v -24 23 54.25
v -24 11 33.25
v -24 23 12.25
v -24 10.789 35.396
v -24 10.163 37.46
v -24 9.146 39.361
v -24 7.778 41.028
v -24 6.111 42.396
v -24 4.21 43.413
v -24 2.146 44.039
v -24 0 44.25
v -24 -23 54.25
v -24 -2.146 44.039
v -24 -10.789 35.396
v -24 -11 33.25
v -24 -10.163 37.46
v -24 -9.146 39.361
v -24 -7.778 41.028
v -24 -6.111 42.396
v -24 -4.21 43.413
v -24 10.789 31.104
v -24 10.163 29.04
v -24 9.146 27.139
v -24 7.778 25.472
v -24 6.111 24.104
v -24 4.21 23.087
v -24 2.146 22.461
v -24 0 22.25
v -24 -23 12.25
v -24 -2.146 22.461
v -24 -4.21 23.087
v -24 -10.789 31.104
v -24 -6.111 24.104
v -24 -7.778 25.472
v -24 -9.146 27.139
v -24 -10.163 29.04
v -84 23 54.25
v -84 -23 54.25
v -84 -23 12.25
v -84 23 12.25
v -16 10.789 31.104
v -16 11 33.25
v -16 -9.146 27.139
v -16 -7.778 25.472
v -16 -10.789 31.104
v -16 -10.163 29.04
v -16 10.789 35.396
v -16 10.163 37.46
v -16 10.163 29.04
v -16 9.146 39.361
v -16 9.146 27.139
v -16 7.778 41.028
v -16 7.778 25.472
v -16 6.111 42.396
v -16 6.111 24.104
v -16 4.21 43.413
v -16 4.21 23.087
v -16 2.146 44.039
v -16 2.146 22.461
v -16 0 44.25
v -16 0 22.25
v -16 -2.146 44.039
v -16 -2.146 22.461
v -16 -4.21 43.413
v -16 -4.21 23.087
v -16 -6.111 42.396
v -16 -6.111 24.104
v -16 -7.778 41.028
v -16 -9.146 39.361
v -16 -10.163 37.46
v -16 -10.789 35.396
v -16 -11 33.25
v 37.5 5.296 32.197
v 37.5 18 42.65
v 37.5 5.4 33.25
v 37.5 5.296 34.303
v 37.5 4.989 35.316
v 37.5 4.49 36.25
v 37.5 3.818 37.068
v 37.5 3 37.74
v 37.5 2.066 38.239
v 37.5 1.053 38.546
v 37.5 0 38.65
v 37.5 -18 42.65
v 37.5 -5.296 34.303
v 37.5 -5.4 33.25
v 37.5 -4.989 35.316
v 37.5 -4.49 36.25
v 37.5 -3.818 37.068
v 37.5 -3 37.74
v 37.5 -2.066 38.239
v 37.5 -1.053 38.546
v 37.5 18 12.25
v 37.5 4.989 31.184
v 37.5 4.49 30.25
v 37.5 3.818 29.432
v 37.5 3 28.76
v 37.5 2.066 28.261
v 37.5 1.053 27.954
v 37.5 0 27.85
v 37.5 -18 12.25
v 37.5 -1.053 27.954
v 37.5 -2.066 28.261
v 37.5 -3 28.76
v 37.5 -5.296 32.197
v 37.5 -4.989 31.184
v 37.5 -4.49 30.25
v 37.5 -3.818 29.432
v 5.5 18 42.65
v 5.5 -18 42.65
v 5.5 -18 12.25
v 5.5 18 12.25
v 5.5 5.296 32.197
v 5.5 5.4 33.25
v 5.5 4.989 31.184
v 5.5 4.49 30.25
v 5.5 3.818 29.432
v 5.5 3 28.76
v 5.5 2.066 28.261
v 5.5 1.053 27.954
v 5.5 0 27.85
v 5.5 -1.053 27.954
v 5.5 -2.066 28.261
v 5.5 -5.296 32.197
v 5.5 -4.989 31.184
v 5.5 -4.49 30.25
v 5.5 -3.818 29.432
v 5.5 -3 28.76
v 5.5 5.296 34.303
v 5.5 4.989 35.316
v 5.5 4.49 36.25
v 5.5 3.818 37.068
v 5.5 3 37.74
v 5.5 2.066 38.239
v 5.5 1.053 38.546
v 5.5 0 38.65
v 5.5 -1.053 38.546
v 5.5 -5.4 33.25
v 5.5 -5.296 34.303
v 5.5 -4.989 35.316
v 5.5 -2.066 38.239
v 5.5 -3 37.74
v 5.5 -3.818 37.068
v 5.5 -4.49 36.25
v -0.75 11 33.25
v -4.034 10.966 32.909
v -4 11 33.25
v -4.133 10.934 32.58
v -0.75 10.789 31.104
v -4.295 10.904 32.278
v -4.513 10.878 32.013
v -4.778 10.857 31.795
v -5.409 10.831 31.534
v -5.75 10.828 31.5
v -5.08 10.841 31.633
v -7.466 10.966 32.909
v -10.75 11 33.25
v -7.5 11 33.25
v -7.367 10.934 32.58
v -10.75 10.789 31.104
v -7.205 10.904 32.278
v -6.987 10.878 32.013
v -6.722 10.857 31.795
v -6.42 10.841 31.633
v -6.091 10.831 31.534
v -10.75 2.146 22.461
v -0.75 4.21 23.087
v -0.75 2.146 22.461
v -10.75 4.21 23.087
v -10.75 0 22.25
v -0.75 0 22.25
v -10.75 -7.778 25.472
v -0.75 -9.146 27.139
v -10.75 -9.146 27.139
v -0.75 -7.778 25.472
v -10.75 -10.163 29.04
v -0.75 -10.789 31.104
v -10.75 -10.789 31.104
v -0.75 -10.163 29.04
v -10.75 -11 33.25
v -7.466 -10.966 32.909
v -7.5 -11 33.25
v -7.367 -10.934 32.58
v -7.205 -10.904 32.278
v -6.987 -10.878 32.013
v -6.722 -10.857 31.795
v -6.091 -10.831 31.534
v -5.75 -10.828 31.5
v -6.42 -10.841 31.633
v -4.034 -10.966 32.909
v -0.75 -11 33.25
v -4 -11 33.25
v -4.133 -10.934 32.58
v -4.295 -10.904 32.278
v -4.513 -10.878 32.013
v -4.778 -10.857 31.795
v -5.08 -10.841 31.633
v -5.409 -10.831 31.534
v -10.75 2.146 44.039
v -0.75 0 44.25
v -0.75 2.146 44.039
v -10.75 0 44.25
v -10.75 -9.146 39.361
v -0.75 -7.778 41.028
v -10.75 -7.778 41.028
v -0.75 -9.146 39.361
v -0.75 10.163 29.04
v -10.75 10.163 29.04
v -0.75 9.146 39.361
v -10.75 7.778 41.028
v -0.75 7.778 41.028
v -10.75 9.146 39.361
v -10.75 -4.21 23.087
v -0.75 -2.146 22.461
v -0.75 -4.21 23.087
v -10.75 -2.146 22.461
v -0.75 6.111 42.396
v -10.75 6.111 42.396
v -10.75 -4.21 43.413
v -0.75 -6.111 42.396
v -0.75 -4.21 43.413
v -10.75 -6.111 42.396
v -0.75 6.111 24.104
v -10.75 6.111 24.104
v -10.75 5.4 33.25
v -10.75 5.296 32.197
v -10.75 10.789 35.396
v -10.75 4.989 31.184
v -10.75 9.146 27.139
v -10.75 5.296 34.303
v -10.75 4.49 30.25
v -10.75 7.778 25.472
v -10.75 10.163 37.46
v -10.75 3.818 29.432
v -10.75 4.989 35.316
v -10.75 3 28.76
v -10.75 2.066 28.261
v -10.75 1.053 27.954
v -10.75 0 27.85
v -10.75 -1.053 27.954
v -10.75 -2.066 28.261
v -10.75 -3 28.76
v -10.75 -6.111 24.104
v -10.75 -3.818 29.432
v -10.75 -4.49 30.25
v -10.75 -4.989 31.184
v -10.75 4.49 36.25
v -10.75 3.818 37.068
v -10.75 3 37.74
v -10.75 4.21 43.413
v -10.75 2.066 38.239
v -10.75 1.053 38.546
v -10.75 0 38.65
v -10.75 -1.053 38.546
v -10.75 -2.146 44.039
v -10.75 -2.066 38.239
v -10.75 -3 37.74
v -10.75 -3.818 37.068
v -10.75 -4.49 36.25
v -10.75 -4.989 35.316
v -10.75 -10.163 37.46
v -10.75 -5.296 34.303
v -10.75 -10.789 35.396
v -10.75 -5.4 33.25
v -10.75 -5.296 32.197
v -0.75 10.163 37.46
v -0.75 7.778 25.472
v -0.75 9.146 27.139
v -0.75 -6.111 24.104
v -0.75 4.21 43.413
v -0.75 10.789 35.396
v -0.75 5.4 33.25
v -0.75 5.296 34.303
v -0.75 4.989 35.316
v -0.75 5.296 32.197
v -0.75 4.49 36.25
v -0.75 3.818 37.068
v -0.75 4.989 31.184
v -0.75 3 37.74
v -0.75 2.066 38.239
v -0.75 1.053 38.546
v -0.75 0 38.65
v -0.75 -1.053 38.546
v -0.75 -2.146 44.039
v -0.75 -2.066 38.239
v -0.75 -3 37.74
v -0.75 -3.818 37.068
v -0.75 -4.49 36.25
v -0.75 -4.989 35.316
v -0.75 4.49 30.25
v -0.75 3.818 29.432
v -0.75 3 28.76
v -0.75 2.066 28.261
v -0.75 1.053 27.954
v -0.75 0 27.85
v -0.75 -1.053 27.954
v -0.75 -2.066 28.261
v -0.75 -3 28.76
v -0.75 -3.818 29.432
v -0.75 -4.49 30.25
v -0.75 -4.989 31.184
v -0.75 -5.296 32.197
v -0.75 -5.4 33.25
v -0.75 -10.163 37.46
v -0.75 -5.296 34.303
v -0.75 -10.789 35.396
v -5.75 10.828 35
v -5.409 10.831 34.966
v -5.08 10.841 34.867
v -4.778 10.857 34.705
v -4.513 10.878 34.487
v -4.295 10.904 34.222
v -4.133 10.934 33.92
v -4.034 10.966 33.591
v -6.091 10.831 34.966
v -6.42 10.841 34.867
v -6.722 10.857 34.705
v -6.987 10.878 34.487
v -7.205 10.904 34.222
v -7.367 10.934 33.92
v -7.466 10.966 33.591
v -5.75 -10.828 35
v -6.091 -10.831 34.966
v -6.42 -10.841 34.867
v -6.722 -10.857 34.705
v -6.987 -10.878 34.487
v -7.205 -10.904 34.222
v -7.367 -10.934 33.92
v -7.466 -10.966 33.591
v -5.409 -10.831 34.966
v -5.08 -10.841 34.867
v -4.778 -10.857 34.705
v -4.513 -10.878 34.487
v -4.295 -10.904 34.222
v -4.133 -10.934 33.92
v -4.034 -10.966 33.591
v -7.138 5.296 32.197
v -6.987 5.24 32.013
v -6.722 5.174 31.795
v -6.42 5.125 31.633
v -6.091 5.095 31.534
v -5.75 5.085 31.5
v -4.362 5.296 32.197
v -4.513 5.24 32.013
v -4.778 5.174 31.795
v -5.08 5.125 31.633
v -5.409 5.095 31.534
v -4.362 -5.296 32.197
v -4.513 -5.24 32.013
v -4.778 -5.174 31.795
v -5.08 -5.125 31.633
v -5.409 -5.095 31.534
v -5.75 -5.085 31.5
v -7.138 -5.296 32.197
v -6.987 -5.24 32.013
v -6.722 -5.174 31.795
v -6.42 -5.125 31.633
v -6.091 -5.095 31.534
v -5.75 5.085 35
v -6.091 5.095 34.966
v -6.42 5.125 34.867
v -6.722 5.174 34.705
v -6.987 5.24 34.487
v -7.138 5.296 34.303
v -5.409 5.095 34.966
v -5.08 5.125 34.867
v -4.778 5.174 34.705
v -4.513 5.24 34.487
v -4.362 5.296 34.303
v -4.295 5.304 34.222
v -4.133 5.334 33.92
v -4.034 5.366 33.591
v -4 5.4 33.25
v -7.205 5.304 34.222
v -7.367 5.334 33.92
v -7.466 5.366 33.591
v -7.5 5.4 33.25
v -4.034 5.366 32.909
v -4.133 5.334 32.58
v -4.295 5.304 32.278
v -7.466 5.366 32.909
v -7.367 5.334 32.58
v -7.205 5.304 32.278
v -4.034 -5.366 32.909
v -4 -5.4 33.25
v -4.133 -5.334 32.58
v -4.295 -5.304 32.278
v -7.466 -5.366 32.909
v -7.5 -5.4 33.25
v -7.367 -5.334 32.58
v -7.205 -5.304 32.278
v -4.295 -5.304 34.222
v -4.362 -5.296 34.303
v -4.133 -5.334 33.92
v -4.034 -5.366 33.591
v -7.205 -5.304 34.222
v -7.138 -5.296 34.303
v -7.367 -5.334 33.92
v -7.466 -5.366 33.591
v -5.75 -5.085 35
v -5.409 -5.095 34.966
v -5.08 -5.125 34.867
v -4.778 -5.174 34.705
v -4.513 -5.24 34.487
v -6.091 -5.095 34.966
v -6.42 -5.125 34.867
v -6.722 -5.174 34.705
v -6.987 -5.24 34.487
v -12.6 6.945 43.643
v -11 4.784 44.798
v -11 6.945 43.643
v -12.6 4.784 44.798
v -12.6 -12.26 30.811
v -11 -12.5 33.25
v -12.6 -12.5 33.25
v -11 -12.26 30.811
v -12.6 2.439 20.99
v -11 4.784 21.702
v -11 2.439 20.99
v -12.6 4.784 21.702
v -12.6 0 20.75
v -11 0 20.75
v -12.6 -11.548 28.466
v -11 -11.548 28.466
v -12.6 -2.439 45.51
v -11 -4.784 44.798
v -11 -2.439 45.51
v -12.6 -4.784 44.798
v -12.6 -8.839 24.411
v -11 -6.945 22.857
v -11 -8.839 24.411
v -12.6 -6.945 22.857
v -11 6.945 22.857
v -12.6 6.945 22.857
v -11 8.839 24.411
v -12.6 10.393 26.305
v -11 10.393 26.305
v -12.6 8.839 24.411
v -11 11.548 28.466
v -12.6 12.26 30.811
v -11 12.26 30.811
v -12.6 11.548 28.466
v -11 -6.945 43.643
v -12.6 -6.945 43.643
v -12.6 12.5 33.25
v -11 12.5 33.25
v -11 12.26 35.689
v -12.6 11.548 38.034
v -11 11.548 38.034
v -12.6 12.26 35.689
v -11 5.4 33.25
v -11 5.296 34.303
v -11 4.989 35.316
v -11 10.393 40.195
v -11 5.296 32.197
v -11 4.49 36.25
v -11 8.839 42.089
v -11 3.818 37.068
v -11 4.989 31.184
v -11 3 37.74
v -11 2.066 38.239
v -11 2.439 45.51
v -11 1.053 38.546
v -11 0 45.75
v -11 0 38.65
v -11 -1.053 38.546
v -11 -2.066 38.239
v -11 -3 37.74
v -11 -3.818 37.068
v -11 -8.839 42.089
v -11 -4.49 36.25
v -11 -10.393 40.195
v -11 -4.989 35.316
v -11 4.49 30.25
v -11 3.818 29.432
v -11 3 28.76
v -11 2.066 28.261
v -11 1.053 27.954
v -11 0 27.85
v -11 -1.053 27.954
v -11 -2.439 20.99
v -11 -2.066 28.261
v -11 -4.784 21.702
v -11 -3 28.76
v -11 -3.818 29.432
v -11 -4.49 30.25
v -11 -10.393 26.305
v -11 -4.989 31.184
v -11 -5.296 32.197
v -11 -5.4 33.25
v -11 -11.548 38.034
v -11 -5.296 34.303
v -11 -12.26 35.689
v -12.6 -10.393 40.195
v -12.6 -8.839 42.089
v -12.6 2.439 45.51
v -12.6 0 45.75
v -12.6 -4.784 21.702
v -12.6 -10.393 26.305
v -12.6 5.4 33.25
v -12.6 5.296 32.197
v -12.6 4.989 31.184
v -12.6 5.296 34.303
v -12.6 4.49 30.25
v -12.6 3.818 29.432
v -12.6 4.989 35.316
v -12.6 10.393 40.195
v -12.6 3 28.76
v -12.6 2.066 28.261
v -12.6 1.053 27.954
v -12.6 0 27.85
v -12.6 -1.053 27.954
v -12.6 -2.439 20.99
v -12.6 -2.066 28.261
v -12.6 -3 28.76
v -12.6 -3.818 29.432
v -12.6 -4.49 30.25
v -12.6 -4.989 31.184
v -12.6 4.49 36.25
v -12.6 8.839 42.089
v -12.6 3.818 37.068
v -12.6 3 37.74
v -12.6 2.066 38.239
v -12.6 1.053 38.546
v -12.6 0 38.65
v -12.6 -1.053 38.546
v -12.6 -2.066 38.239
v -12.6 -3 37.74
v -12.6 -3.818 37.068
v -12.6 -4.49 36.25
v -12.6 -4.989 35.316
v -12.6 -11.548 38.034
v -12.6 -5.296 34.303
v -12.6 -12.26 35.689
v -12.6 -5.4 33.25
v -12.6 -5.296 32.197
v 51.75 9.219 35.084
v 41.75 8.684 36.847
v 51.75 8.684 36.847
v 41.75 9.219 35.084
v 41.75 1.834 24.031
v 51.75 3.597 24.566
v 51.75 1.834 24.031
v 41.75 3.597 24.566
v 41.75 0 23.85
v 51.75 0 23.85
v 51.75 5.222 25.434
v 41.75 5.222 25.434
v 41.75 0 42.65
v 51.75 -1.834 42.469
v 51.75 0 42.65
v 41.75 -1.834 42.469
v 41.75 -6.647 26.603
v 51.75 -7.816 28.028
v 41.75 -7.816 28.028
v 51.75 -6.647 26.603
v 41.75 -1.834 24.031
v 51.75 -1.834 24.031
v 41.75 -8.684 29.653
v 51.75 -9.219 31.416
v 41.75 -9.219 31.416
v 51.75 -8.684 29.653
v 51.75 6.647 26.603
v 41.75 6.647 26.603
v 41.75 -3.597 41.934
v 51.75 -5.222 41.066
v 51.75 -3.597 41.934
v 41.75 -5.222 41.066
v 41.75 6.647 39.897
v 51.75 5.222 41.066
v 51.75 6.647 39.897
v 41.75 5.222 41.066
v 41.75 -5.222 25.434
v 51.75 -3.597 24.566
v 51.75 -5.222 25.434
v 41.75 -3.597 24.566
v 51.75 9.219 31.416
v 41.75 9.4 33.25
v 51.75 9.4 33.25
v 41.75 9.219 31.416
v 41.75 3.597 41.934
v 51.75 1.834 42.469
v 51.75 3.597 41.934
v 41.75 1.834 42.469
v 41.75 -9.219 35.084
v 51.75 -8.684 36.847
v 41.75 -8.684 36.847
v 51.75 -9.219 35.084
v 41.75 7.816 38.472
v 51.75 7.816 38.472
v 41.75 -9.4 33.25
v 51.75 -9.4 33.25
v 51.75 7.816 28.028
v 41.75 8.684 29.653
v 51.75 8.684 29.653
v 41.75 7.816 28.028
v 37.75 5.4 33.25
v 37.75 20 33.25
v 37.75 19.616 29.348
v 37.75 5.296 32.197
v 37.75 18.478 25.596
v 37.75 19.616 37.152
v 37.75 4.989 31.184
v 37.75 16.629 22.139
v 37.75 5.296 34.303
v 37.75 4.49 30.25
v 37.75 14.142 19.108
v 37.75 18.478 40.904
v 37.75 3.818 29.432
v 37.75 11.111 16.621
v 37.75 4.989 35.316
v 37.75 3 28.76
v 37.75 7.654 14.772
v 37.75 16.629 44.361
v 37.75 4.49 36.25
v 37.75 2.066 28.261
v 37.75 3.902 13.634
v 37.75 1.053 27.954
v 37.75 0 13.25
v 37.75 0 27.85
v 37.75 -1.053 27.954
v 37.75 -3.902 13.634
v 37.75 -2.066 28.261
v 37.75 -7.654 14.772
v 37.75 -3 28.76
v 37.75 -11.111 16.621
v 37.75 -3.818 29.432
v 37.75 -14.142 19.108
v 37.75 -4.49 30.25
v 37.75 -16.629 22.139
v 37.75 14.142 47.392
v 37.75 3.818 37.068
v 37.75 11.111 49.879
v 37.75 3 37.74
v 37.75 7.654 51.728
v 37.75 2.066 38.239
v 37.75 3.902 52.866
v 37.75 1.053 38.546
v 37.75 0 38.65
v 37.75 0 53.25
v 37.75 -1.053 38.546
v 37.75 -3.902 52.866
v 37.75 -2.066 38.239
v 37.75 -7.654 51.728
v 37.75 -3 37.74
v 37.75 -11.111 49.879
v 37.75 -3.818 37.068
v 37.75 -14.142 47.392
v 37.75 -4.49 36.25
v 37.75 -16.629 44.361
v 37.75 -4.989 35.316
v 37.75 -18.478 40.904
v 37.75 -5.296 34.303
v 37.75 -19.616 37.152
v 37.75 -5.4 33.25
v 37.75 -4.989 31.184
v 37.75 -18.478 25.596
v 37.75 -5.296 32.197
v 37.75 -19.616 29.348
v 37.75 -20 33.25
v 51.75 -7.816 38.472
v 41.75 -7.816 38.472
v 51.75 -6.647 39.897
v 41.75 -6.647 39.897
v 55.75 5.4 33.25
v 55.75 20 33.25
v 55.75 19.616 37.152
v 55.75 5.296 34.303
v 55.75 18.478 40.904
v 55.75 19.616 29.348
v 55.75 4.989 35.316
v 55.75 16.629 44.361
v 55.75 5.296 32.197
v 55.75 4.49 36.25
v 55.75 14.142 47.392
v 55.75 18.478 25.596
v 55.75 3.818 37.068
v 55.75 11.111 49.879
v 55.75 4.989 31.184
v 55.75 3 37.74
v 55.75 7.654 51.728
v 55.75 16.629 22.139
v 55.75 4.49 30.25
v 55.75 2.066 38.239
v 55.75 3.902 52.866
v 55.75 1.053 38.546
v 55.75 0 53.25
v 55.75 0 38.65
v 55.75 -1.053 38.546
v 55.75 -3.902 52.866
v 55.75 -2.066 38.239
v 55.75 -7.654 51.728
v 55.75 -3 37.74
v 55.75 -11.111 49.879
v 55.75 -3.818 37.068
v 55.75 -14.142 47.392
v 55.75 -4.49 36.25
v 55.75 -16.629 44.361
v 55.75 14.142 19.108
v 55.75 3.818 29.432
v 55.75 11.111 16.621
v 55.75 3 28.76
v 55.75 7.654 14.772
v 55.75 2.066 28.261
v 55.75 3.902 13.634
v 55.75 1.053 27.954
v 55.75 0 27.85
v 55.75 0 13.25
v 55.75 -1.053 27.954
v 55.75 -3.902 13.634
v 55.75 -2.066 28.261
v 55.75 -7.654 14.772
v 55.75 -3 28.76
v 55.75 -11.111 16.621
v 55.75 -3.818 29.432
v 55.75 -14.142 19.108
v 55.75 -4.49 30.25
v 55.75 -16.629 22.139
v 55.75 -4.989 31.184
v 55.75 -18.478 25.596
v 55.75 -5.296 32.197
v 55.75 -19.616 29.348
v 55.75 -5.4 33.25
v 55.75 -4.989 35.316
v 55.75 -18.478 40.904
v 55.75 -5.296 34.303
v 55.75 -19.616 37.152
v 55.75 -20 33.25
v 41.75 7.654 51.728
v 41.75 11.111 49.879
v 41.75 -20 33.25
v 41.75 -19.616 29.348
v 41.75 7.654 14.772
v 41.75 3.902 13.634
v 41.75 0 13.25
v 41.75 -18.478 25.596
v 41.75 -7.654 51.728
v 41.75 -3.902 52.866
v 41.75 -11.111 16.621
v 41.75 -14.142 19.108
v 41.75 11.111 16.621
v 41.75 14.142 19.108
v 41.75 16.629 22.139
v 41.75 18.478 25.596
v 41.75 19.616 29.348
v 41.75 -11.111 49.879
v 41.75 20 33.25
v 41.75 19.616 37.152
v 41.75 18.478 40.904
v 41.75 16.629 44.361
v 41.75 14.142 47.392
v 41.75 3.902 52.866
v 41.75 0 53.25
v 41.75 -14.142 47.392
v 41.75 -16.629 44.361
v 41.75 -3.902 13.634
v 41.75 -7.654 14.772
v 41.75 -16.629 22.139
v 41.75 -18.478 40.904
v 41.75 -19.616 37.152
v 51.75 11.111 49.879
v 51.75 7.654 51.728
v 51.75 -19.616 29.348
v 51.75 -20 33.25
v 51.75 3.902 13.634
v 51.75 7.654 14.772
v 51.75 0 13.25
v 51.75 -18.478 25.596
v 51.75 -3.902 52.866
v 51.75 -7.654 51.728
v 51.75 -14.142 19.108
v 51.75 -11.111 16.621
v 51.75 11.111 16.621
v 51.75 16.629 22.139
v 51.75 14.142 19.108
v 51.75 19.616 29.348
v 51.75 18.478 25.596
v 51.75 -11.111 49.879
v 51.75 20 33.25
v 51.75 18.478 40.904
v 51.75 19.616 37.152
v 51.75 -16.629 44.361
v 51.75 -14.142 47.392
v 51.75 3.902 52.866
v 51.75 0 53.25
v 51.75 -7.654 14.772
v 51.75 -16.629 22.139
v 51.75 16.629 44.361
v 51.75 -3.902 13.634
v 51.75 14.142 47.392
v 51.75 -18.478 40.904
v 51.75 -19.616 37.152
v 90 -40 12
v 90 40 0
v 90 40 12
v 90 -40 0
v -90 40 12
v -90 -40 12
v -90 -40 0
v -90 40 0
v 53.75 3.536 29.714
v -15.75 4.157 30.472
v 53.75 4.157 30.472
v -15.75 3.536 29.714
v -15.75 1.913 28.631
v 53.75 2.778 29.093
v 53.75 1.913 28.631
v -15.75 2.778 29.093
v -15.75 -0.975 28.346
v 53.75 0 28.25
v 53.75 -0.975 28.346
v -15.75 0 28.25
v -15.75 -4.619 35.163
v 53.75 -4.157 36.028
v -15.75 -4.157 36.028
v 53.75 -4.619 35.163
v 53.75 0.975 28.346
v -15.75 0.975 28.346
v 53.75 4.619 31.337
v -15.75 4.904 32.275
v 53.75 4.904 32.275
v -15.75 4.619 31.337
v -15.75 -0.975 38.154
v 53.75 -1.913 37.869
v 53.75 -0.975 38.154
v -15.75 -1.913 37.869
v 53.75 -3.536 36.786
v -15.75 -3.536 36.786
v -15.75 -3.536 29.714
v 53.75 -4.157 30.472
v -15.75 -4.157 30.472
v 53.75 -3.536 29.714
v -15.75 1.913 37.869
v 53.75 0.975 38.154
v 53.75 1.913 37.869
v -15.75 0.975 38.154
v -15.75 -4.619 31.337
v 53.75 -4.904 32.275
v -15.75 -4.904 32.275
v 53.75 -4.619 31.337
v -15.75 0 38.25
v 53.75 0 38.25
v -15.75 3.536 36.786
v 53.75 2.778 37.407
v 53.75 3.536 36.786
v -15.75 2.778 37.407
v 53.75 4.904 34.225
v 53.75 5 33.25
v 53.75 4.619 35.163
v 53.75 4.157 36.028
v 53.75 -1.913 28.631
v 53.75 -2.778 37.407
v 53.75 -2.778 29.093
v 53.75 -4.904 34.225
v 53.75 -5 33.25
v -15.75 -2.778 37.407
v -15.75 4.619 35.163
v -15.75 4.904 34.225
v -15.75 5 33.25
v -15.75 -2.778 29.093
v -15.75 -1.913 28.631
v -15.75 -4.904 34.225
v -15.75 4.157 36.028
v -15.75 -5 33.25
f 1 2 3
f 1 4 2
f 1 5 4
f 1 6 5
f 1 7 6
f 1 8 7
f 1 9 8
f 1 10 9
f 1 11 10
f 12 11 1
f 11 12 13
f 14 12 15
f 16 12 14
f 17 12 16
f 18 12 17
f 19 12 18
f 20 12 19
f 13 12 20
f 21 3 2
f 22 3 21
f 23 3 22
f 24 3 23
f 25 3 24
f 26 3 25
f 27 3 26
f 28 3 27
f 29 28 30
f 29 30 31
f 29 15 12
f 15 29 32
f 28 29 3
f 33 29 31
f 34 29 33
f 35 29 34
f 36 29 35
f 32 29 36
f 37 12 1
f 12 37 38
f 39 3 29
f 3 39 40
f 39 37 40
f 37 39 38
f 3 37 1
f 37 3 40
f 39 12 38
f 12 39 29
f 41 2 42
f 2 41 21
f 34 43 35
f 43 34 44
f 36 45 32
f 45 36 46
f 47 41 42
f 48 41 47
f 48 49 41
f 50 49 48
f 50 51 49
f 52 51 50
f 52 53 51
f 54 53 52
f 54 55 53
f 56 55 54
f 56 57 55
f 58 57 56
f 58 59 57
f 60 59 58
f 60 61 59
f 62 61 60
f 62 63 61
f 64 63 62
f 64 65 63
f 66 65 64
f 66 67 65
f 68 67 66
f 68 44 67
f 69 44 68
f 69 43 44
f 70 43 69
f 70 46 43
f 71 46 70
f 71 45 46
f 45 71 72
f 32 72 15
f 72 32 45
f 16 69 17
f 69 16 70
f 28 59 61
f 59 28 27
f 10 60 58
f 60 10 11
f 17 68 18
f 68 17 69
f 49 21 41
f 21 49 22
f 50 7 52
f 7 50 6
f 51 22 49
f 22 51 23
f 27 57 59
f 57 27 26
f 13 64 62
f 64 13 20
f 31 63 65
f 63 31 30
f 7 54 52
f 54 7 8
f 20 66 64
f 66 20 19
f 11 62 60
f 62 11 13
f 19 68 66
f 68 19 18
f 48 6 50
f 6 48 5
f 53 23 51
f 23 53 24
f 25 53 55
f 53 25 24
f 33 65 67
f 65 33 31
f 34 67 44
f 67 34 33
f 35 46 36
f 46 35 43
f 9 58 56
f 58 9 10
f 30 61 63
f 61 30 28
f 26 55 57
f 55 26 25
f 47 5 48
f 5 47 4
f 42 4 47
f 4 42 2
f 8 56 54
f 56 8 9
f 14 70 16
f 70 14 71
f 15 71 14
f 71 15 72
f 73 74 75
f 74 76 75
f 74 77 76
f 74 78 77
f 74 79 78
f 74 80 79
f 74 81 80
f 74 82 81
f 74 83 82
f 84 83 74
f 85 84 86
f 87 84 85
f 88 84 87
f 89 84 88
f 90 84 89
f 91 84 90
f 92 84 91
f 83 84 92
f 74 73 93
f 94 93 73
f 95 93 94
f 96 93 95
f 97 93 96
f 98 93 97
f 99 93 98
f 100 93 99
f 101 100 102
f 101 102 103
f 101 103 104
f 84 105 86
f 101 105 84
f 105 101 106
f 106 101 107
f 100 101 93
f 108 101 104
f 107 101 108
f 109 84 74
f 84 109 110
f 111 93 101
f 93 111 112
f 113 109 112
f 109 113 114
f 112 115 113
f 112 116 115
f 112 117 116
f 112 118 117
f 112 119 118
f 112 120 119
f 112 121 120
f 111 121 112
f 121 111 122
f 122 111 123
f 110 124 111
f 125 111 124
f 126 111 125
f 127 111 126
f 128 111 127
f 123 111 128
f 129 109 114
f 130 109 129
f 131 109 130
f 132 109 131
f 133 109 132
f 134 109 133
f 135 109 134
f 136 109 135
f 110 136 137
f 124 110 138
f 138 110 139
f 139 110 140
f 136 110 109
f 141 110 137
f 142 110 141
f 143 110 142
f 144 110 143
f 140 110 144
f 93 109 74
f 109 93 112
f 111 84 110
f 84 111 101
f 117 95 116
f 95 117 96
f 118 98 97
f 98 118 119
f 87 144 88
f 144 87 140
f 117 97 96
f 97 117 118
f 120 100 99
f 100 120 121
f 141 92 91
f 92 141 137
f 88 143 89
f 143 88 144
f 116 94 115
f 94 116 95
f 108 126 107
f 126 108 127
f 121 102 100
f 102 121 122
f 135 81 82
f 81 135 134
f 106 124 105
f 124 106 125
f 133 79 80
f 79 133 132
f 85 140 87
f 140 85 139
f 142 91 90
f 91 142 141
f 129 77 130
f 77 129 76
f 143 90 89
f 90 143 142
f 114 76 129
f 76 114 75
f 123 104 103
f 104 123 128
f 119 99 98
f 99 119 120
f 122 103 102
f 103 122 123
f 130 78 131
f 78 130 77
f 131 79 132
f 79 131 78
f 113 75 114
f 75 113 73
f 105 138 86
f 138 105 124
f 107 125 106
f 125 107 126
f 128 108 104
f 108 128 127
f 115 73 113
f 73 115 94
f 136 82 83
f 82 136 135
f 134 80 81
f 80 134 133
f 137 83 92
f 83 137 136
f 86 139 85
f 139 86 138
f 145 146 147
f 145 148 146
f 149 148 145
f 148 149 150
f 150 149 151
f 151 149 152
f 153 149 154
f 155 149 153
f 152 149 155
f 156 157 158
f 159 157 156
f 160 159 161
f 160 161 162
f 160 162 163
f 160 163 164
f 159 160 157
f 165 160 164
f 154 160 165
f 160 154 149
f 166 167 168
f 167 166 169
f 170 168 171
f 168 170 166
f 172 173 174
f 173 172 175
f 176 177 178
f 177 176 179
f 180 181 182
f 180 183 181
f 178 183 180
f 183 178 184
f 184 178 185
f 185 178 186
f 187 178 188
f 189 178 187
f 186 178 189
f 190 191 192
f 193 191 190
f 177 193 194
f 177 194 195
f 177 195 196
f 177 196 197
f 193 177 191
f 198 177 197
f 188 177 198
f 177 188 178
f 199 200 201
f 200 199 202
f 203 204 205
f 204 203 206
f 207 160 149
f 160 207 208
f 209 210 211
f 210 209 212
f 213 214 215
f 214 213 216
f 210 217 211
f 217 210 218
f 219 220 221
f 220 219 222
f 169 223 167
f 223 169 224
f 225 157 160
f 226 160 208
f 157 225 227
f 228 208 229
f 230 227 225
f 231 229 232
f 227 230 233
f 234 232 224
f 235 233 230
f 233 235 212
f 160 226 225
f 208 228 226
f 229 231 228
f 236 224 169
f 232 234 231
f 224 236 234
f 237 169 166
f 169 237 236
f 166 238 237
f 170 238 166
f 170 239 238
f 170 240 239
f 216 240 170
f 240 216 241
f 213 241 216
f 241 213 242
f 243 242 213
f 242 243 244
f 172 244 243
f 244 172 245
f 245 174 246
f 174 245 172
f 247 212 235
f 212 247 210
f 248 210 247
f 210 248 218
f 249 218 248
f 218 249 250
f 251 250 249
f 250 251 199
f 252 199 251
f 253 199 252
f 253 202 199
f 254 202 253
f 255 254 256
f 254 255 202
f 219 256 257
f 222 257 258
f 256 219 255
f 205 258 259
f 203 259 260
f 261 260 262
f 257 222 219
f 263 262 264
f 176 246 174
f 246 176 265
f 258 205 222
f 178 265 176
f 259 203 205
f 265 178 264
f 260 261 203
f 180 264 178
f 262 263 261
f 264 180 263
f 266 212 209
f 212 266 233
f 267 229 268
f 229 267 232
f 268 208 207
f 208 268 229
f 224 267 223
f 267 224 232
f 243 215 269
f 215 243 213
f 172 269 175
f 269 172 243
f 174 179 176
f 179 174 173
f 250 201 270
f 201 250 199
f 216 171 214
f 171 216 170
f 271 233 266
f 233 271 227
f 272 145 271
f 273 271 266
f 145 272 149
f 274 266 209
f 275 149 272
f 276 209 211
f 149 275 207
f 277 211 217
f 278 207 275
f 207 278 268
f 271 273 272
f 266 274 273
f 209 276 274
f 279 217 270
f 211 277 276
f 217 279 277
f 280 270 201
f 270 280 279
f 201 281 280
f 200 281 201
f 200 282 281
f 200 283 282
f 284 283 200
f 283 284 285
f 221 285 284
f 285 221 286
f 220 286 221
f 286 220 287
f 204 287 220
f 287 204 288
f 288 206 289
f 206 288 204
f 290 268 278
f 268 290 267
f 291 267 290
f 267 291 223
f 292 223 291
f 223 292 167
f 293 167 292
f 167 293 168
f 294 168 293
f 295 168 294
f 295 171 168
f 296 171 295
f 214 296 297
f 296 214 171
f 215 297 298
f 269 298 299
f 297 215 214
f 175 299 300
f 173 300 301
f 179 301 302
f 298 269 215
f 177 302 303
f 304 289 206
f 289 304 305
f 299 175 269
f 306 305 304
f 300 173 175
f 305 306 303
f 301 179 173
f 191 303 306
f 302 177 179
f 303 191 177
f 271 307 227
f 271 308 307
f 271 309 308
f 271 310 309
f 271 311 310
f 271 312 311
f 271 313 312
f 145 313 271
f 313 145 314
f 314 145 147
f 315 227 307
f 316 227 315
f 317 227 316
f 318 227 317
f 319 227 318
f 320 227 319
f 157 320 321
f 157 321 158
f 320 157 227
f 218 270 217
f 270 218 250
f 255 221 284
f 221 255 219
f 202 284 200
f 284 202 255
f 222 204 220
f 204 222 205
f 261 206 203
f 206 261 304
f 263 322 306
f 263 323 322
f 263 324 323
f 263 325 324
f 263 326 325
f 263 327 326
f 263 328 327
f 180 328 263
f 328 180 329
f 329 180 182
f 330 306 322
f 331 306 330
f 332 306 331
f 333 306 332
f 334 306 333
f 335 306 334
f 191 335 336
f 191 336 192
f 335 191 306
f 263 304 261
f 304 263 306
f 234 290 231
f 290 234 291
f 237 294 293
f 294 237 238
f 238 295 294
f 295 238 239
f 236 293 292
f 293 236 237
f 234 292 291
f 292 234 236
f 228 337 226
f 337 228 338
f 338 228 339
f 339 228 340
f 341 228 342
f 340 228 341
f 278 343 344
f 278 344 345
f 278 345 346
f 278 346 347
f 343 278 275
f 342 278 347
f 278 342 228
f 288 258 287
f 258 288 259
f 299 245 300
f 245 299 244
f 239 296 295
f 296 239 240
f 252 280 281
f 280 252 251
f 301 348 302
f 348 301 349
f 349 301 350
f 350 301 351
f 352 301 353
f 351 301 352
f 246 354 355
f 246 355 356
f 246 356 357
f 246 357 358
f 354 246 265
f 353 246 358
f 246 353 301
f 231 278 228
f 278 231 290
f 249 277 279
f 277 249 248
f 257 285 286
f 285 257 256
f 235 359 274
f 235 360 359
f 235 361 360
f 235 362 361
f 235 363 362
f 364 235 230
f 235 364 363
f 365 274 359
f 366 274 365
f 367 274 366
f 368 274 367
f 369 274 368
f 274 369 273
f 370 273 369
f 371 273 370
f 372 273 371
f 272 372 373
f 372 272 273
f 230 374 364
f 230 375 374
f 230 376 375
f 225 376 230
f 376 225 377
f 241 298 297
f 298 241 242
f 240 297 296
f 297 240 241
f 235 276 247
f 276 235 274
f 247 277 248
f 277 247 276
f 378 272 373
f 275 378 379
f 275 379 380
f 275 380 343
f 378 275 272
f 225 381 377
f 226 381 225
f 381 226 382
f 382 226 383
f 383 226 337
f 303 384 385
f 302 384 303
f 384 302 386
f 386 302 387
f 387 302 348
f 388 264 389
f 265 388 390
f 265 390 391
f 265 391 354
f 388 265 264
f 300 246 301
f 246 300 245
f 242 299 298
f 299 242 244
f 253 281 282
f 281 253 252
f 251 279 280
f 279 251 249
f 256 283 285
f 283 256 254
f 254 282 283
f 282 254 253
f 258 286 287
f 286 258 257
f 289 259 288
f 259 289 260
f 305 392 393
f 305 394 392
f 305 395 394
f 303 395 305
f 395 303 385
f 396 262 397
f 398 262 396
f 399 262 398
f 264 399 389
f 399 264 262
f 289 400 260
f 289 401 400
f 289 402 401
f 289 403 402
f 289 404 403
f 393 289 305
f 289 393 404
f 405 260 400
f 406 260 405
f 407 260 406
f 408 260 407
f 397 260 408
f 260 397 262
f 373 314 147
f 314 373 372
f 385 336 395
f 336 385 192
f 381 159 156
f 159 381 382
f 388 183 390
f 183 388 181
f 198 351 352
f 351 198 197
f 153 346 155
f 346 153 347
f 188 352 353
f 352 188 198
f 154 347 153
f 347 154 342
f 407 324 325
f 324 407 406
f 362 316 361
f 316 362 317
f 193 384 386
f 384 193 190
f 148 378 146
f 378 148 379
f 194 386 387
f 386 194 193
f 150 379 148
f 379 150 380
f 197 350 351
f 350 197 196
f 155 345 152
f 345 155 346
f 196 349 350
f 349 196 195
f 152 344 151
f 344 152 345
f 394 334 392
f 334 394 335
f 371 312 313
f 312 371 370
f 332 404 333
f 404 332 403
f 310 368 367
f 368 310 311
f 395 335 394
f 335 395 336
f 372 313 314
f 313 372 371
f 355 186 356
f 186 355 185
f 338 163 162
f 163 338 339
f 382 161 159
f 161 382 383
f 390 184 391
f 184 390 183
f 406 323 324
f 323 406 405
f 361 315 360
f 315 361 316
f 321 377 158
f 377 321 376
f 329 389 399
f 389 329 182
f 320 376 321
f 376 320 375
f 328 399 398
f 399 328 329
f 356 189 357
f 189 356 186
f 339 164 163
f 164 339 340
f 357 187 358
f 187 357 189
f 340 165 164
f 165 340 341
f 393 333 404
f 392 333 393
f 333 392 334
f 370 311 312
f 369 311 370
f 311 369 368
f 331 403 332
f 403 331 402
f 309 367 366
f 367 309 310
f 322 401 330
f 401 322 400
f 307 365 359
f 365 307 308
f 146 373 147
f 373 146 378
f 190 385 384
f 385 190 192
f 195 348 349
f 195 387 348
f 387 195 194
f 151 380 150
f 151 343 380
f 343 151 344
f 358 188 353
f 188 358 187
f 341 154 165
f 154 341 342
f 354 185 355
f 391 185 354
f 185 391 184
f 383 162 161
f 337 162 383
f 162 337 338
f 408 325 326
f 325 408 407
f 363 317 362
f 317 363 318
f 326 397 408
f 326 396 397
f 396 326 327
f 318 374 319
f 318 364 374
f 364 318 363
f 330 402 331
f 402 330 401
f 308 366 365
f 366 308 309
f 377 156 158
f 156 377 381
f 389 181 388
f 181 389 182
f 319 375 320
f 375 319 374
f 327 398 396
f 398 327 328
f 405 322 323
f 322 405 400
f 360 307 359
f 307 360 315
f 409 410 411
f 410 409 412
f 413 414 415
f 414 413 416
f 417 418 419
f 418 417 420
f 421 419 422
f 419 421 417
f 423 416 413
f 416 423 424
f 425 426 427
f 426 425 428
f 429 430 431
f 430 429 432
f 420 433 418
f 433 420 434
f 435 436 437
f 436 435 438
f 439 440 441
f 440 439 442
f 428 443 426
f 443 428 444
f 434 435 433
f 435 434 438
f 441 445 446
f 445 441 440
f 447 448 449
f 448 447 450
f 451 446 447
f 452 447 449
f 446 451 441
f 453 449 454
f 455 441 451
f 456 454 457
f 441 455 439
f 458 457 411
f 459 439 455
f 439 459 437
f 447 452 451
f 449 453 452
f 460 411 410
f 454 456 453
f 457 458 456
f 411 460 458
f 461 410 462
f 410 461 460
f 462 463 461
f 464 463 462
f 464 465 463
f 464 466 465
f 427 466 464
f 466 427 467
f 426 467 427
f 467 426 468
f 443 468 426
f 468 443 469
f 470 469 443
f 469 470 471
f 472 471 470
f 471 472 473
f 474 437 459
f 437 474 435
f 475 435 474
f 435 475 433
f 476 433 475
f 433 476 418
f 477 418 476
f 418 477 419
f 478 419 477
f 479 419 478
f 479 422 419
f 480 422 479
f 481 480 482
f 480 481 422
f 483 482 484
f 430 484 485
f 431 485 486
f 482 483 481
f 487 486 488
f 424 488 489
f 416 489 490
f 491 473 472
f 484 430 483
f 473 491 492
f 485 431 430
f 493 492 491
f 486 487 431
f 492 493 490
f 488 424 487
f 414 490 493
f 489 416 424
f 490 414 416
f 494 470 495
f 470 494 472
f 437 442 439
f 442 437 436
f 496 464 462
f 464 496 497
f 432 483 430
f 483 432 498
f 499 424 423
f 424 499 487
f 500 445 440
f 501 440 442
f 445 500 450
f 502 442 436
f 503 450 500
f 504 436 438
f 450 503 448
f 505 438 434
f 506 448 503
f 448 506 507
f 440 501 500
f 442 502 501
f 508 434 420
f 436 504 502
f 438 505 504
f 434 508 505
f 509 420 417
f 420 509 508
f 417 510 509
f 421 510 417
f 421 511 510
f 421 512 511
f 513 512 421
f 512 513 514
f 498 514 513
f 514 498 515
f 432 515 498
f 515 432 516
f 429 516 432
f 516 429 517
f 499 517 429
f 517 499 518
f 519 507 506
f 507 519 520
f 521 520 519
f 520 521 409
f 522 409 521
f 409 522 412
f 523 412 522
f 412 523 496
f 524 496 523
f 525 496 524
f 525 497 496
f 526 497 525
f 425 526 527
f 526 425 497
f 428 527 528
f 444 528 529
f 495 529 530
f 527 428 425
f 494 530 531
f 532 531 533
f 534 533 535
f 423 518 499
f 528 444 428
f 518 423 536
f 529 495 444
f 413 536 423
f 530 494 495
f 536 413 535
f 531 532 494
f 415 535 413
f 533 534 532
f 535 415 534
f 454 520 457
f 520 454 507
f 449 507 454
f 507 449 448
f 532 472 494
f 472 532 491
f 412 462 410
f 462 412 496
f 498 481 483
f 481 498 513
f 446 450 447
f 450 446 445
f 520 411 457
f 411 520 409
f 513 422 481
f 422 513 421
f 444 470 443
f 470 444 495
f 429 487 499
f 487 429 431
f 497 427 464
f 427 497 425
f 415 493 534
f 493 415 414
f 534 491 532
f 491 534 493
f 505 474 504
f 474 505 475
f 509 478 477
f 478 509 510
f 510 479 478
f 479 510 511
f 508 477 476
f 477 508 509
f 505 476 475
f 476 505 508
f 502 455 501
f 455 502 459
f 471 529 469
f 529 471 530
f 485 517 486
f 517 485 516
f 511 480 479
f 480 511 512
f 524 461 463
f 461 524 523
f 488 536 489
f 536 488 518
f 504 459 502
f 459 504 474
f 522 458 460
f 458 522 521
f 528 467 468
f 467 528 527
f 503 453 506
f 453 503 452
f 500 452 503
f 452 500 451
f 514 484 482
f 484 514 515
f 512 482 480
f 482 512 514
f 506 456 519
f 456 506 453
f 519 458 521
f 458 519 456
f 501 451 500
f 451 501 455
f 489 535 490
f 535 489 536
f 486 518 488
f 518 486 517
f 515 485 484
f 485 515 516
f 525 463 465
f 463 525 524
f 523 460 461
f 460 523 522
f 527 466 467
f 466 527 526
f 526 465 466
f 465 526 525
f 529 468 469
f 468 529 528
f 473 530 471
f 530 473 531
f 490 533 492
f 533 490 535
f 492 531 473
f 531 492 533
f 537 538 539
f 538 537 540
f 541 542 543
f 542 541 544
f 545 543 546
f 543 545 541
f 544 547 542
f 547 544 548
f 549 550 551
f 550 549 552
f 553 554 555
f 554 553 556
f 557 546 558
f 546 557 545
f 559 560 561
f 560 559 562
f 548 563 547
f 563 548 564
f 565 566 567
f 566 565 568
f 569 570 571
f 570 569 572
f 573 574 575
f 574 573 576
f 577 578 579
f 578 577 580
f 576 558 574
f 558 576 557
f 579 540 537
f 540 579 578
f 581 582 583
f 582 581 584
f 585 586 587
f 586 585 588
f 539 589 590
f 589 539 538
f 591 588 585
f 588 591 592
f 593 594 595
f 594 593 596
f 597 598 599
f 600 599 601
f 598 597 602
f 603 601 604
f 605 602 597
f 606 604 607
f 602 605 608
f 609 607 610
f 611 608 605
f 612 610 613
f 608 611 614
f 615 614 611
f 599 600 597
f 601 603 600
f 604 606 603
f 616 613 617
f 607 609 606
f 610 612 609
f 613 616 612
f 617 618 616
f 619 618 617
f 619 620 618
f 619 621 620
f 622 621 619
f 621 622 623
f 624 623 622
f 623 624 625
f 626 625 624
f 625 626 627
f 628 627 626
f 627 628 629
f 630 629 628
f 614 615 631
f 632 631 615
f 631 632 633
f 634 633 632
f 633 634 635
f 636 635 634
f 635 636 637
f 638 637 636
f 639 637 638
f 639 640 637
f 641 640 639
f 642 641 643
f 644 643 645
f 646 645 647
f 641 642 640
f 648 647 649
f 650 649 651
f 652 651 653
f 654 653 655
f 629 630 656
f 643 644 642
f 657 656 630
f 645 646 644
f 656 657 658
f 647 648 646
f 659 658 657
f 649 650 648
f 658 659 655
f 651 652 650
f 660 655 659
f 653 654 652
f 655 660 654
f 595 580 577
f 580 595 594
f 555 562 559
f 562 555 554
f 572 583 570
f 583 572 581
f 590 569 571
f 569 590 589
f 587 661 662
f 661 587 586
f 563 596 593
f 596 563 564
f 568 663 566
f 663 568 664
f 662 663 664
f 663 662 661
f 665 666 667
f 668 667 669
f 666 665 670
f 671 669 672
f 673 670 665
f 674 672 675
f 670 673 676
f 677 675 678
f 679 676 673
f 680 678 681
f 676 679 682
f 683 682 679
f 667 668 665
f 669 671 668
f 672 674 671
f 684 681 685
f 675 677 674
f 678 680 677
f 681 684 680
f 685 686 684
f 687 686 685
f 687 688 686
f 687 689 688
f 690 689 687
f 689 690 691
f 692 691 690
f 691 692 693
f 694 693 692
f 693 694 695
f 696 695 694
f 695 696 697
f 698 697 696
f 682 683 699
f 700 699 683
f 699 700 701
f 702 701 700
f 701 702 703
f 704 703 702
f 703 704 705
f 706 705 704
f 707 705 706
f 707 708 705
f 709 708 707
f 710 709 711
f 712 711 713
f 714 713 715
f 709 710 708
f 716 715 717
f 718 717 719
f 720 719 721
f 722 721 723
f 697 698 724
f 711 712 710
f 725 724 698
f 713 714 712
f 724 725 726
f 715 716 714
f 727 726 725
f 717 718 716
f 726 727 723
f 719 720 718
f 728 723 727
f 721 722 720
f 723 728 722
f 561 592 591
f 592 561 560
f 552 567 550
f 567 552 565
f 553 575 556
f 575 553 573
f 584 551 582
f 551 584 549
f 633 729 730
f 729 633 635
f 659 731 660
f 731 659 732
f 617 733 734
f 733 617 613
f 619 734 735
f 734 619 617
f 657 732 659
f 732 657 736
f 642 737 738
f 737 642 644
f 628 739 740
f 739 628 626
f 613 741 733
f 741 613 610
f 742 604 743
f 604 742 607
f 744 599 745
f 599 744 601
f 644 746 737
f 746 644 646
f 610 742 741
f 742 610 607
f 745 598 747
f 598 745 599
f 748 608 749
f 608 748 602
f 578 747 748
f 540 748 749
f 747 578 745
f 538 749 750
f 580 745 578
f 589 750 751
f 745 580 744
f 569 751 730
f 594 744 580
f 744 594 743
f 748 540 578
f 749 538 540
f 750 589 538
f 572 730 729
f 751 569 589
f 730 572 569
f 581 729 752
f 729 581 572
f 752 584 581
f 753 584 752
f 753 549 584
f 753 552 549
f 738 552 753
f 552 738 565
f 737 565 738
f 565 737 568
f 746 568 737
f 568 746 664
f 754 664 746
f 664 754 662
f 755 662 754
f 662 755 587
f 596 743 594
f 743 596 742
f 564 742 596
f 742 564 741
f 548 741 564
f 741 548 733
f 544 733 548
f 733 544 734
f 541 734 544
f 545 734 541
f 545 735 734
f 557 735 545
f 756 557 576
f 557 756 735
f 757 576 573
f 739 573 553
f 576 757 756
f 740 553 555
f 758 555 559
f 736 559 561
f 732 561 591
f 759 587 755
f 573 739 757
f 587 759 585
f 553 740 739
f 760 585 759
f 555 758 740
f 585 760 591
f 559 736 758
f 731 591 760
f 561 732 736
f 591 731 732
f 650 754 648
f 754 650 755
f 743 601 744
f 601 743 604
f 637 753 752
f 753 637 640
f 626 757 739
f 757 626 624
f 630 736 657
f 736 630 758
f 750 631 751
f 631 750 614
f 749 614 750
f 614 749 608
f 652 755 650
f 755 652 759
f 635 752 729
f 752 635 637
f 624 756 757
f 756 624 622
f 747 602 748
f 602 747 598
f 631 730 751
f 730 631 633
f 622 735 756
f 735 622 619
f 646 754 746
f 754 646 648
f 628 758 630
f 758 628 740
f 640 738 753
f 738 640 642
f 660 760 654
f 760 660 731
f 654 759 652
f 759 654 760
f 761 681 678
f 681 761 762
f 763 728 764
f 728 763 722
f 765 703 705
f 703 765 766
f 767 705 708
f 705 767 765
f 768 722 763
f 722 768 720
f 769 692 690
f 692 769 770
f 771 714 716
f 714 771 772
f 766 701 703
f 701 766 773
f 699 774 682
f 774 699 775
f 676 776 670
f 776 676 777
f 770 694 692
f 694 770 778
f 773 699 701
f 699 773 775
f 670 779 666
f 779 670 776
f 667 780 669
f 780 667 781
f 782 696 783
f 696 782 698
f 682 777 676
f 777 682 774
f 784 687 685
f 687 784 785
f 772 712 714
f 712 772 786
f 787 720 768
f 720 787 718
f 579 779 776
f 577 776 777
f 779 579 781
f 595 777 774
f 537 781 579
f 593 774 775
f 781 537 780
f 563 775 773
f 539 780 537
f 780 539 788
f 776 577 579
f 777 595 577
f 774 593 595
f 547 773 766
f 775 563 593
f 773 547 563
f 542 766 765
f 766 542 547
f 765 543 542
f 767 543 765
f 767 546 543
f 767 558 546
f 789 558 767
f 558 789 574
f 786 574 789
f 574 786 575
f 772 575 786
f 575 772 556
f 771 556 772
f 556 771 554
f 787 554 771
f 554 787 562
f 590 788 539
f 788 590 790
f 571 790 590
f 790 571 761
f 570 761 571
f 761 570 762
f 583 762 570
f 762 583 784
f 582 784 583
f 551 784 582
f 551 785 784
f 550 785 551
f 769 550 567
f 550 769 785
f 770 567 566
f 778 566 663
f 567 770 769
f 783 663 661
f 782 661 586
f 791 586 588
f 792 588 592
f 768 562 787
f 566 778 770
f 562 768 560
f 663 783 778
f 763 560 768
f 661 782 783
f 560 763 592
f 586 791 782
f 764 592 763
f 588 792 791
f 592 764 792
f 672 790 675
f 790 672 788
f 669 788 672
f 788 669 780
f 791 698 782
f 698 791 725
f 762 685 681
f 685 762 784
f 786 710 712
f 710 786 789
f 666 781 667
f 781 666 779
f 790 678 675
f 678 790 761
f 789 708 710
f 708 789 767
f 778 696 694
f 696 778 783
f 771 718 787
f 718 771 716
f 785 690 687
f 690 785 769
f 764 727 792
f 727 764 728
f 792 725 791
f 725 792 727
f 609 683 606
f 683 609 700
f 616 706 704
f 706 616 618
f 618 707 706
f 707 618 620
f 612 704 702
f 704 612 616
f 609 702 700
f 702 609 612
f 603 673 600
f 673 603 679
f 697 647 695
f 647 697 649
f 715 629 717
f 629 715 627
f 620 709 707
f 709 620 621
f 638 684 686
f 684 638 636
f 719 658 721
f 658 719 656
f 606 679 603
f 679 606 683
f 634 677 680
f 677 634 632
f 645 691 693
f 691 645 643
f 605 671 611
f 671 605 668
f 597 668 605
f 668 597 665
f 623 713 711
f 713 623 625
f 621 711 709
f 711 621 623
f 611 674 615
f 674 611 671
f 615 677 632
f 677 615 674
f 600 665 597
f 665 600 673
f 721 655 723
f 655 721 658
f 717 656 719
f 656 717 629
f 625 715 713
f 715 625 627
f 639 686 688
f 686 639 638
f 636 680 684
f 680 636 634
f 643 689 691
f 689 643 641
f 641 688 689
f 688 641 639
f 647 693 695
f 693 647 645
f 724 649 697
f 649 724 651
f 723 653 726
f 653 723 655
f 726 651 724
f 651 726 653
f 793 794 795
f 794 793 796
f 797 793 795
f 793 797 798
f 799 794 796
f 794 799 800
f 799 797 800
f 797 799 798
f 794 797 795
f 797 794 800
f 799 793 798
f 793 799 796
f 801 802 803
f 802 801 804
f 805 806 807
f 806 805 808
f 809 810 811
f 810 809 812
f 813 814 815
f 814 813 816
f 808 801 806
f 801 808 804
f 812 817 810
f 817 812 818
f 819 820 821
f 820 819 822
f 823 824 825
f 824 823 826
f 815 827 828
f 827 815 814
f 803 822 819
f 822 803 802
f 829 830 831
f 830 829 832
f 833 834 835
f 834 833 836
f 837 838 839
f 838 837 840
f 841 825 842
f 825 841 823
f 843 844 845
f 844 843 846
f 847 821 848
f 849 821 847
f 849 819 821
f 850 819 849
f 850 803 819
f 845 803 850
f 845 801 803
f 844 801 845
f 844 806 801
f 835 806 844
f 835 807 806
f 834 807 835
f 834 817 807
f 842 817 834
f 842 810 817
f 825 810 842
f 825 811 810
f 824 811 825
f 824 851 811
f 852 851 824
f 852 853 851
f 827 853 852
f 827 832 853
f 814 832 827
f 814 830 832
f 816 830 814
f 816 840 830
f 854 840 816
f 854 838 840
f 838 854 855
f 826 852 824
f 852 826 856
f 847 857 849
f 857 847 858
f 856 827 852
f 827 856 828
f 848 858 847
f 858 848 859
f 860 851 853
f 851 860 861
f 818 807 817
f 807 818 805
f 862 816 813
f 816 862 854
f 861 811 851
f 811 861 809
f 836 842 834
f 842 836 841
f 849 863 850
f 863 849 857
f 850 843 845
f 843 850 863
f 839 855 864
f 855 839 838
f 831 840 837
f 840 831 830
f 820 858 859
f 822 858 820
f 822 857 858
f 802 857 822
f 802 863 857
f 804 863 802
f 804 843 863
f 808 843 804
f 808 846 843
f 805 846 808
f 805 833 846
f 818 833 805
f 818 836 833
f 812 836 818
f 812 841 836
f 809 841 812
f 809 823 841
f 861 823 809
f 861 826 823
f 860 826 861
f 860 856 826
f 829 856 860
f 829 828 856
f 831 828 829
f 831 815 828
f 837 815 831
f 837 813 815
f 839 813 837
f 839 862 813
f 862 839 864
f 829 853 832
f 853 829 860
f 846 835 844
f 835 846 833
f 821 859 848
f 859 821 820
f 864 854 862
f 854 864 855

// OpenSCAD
$fn = 32;

// ------------------------------------------------------------------------
// Motor drive station: motor 60 x 42 mm, shaft d10, pulley d40
// Every part is its own module, assembly() places every instance.
// ------------------------------------------------------------------------

// --- part 1 ---
module station_bed() {
  difference() {
    translate([-90, -40, 0]) cube([180, 80, 12]);
  }
}

// --- part 2 ---
module drive_motor() {
  union() {
    translate([-30, -23, 0]) cube([60, 46, 42]);
    translate([34, 0, 21]) rotate([0, 90, 0]) cylinder(h = 8, d = 22, center = true);
  }
}

// --- part 3 ---
module pillow_block() {
  difference() {
    translate([-16, -18, 0]) cube([32, 36, 30.4]);
    translate([0, 0, 21]) rotate([0, 90, 0]) cylinder(h = 34, d = 10.8, center = true);
  }
}

// --- part 4 ---
module drive_shaft() {
  translate([0, 0, -34.75]) cylinder(h = 69.5, d = 10);
}

// --- part 5 ---
module shaft_collar() {
  difference() {
    cylinder(h = 10, d = 22);
    translate([0, 0, -1]) cylinder(h = 12, d = 10.8);
    translate([0, 0, 5]) rotate([90, 0, 0]) cylinder(h = 24, d = 3.5, center = true);
  }
}

// --- part 6 ---
module collar_washer() {
  difference() {
      translate([0, 0, 0]) cylinder(h = 1.6, d = 25);
      translate([0, 0, -1]) cylinder(h = 3.6, d = 10.8);
    }
}

// --- part 7 ---
module drive_pulley() {
  difference() {
    union() {
      cylinder(h = 18, d = 18.8);
      cylinder(h = 4, d = 40);
      translate([0, 0, 14]) cylinder(h = 4, d = 40);
    }
    translate([0, 0, -1]) cylinder(h = 20, d = 10.8);
  }
}

// --- assembly ---
module assembly() {
  color([0.80, 0.24, 0.20]) translate([0, 0, 0]) rotate([0, 0, 0]) station_bed();
  color([0.20, 0.45, 0.75]) translate([-54, 0, 12.25]) rotate([0, 0, 0]) drive_motor();
  color([0.25, 0.62, 0.32]) translate([21.5, 0, 12.25]) rotate([0, 0, 0]) pillow_block();
  color([0.92, 0.70, 0.18]) translate([19, 0, 33.25]) rotate([0, 90, 0]) drive_shaft();
  color([0.58, 0.35, 0.70]) translate([-10.75, 0, 33.25]) rotate([0, 90, 0]) shaft_collar();
  color([0.16, 0.66, 0.66]) translate([-12.6, 0, 33.25]) rotate([0, 90, 0]) collar_washer();
  color([0.85, 0.48, 0.18]) translate([37.75, 0, 33.25]) rotate([0, 90, 0]) drive_pulley();
}

assembly();
